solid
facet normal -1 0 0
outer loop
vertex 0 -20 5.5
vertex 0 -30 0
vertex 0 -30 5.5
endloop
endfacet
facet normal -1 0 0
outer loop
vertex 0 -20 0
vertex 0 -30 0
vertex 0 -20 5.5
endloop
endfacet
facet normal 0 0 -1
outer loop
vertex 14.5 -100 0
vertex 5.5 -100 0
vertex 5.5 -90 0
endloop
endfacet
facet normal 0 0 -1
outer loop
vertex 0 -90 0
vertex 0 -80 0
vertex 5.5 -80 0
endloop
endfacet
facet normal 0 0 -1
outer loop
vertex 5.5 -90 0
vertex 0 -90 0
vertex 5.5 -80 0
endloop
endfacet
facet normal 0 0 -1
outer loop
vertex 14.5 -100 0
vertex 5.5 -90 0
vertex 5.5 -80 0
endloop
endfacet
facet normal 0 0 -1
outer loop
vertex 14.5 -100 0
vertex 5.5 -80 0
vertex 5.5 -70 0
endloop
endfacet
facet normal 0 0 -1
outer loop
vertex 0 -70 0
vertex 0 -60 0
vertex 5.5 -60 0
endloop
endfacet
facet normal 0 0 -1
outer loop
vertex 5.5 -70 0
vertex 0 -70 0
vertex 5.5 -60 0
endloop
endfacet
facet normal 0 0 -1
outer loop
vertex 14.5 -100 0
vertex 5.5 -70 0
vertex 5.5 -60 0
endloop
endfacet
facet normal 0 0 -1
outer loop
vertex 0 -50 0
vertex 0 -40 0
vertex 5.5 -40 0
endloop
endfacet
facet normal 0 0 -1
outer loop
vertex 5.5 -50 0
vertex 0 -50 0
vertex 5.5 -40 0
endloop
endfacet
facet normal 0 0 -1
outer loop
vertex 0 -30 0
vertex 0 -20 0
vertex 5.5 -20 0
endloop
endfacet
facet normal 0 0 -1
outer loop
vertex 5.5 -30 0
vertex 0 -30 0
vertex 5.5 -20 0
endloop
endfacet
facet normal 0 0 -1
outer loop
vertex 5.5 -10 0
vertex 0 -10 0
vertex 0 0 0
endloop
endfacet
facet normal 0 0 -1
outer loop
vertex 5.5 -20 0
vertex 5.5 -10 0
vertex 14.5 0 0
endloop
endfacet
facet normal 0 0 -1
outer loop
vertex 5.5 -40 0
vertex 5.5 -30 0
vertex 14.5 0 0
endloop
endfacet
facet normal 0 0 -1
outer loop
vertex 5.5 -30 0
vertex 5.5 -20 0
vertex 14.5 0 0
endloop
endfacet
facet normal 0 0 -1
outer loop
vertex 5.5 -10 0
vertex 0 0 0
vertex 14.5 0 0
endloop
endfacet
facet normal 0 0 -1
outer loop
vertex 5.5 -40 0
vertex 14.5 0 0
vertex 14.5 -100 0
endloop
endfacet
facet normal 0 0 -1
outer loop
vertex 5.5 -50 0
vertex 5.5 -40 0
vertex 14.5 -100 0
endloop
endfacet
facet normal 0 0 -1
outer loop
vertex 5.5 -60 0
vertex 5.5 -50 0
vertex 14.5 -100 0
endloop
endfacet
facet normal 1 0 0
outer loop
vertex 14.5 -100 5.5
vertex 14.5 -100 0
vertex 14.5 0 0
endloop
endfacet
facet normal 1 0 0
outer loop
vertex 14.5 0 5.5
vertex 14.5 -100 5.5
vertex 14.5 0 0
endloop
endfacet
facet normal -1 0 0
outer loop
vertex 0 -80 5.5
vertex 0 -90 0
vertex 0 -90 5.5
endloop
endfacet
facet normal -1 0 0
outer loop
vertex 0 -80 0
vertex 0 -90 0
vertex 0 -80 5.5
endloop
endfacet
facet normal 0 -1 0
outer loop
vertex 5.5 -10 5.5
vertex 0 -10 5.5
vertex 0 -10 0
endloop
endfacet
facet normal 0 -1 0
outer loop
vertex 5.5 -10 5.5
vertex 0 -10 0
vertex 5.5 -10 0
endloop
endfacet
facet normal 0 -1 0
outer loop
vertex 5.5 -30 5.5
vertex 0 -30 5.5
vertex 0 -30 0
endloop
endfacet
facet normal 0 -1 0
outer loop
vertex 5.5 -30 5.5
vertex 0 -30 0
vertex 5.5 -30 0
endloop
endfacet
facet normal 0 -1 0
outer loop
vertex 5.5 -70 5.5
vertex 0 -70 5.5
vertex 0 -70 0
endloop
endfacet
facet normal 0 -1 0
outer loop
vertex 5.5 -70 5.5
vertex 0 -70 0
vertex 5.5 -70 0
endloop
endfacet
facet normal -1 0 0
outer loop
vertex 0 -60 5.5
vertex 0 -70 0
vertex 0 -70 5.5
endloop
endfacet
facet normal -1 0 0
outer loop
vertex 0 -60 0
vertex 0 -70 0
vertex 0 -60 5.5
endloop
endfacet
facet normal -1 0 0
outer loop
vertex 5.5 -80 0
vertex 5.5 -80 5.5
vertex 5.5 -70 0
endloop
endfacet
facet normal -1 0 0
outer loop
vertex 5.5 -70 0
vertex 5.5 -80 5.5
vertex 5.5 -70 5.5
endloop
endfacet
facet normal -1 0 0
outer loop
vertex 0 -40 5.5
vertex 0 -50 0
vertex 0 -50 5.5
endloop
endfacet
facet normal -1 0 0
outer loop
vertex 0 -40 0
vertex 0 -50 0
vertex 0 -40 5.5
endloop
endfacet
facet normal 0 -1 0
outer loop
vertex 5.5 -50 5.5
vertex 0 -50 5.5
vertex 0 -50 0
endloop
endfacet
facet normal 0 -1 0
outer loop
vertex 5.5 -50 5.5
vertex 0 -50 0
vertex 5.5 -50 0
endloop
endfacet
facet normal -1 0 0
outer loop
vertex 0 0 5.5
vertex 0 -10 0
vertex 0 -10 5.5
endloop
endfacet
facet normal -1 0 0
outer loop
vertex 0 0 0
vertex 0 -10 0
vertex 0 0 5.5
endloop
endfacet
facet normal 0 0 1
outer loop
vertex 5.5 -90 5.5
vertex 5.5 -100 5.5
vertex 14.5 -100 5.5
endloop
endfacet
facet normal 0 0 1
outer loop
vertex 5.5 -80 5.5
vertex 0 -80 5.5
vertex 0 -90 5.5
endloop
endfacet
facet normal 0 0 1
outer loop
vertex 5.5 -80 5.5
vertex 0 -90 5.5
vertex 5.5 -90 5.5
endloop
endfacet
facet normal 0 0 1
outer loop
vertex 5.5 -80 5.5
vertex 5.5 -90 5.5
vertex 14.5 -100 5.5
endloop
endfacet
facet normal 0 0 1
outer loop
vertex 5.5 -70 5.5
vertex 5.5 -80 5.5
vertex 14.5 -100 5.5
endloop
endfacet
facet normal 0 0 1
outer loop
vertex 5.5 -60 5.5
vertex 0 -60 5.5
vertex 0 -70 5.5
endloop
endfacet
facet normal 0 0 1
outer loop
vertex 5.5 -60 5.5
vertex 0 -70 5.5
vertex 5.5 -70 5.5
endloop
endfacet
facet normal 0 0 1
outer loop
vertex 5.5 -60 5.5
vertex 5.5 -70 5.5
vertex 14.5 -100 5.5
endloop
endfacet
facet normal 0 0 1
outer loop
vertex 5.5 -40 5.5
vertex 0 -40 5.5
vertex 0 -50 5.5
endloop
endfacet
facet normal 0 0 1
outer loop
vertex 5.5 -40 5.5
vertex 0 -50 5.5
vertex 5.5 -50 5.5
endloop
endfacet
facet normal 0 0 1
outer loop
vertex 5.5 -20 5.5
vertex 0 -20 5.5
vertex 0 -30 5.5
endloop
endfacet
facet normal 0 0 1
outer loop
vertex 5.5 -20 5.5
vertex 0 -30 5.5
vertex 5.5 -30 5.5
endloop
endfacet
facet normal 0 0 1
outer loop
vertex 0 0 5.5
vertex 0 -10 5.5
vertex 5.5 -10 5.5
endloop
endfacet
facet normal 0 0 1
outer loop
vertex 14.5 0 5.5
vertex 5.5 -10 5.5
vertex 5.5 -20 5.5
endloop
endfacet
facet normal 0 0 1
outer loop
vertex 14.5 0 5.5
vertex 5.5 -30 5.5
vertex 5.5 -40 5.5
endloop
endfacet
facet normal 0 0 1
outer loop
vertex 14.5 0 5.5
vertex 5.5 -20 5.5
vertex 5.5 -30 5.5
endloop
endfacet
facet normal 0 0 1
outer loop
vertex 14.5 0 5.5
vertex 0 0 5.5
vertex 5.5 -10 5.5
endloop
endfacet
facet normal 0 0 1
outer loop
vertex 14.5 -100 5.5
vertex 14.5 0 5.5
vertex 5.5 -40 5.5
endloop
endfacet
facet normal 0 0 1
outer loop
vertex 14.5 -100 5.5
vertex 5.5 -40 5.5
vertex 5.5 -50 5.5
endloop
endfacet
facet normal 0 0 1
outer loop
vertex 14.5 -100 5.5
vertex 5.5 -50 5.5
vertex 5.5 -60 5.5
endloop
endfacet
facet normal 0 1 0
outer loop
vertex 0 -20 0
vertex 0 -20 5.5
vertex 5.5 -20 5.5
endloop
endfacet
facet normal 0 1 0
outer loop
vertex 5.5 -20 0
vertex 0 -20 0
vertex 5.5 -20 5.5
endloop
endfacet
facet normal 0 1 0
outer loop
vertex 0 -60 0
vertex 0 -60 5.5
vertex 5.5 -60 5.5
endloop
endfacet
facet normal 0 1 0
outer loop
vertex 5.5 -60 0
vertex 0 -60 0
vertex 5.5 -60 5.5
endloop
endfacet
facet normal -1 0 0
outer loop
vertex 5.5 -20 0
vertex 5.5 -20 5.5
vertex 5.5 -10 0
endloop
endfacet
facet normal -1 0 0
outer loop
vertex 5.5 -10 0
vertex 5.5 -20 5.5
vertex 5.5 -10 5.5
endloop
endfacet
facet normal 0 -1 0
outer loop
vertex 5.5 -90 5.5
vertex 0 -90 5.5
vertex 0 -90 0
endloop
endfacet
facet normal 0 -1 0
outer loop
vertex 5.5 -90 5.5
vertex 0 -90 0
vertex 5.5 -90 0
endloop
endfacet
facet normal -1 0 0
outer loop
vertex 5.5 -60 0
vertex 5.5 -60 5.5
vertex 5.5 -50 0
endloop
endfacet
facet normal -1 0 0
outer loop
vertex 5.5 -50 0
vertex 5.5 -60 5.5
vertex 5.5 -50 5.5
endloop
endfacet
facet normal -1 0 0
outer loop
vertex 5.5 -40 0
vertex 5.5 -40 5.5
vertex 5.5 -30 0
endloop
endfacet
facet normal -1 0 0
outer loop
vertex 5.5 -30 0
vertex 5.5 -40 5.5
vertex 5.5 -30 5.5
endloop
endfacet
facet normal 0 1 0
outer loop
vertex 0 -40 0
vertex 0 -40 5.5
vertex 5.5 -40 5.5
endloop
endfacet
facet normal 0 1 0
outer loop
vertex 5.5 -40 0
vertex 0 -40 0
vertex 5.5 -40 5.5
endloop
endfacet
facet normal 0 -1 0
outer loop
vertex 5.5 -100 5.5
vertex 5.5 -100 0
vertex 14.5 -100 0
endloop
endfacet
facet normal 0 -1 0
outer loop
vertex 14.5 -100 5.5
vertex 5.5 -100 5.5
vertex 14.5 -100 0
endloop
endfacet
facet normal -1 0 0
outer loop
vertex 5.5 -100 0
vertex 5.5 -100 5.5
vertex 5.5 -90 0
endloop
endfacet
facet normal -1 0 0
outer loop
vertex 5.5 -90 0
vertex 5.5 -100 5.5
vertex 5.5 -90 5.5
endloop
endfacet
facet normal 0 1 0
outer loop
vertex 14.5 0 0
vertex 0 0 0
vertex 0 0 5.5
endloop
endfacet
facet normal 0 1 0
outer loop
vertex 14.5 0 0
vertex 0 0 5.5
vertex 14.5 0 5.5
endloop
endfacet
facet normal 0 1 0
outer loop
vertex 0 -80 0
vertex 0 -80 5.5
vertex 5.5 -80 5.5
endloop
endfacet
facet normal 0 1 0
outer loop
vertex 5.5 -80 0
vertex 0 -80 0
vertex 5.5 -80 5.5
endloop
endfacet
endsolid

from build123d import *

# Parameters (mm, degrees)
SKETCH_1_W          = 14.5
SKETCH_1_H          = 100
EXTRUDE_1_DEPTH     = 5.5
SKETCH_2_W          = 5.5
SKETCH_2_H          = 10
CUT_EXTRUDE_1_DEPTH = 102.195355625


with BuildPart() as part:
    # ｽｹｯﾁ1 → ﾎﾞｽ - 押し出し1 (new body)
    with BuildSketch(Plane.XY):
        with Locations((7.25, -50)):
            Rectangle(SKETCH_1_W, SKETCH_1_H)
    extrude(amount=EXTRUDE_1_DEPTH)

    # ｽｹｯﾁ2 → ｶｯﾄ - 押し出し1 (cut, through all)
    with BuildSketch(Plane.XY.offset(5.5)):
        with Locations((2.75, -15)):
            Rectangle(SKETCH_2_W, SKETCH_2_H)
        with Locations((2.75, -35)):
            Rectangle(SKETCH_2_W, SKETCH_2_H)
        with Locations((2.75, -55)):
            Rectangle(SKETCH_2_W, SKETCH_2_H)
        with Locations((2.75, -75)):
            Rectangle(SKETCH_2_W, SKETCH_2_H)
        with Locations((2.75, -95)):
            Rectangle(SKETCH_2_W, SKETCH_2_H)
    extrude(amount=-CUT_EXTRUDE_1_DEPTH, mode=Mode.SUBTRACT)


solid = part.part
